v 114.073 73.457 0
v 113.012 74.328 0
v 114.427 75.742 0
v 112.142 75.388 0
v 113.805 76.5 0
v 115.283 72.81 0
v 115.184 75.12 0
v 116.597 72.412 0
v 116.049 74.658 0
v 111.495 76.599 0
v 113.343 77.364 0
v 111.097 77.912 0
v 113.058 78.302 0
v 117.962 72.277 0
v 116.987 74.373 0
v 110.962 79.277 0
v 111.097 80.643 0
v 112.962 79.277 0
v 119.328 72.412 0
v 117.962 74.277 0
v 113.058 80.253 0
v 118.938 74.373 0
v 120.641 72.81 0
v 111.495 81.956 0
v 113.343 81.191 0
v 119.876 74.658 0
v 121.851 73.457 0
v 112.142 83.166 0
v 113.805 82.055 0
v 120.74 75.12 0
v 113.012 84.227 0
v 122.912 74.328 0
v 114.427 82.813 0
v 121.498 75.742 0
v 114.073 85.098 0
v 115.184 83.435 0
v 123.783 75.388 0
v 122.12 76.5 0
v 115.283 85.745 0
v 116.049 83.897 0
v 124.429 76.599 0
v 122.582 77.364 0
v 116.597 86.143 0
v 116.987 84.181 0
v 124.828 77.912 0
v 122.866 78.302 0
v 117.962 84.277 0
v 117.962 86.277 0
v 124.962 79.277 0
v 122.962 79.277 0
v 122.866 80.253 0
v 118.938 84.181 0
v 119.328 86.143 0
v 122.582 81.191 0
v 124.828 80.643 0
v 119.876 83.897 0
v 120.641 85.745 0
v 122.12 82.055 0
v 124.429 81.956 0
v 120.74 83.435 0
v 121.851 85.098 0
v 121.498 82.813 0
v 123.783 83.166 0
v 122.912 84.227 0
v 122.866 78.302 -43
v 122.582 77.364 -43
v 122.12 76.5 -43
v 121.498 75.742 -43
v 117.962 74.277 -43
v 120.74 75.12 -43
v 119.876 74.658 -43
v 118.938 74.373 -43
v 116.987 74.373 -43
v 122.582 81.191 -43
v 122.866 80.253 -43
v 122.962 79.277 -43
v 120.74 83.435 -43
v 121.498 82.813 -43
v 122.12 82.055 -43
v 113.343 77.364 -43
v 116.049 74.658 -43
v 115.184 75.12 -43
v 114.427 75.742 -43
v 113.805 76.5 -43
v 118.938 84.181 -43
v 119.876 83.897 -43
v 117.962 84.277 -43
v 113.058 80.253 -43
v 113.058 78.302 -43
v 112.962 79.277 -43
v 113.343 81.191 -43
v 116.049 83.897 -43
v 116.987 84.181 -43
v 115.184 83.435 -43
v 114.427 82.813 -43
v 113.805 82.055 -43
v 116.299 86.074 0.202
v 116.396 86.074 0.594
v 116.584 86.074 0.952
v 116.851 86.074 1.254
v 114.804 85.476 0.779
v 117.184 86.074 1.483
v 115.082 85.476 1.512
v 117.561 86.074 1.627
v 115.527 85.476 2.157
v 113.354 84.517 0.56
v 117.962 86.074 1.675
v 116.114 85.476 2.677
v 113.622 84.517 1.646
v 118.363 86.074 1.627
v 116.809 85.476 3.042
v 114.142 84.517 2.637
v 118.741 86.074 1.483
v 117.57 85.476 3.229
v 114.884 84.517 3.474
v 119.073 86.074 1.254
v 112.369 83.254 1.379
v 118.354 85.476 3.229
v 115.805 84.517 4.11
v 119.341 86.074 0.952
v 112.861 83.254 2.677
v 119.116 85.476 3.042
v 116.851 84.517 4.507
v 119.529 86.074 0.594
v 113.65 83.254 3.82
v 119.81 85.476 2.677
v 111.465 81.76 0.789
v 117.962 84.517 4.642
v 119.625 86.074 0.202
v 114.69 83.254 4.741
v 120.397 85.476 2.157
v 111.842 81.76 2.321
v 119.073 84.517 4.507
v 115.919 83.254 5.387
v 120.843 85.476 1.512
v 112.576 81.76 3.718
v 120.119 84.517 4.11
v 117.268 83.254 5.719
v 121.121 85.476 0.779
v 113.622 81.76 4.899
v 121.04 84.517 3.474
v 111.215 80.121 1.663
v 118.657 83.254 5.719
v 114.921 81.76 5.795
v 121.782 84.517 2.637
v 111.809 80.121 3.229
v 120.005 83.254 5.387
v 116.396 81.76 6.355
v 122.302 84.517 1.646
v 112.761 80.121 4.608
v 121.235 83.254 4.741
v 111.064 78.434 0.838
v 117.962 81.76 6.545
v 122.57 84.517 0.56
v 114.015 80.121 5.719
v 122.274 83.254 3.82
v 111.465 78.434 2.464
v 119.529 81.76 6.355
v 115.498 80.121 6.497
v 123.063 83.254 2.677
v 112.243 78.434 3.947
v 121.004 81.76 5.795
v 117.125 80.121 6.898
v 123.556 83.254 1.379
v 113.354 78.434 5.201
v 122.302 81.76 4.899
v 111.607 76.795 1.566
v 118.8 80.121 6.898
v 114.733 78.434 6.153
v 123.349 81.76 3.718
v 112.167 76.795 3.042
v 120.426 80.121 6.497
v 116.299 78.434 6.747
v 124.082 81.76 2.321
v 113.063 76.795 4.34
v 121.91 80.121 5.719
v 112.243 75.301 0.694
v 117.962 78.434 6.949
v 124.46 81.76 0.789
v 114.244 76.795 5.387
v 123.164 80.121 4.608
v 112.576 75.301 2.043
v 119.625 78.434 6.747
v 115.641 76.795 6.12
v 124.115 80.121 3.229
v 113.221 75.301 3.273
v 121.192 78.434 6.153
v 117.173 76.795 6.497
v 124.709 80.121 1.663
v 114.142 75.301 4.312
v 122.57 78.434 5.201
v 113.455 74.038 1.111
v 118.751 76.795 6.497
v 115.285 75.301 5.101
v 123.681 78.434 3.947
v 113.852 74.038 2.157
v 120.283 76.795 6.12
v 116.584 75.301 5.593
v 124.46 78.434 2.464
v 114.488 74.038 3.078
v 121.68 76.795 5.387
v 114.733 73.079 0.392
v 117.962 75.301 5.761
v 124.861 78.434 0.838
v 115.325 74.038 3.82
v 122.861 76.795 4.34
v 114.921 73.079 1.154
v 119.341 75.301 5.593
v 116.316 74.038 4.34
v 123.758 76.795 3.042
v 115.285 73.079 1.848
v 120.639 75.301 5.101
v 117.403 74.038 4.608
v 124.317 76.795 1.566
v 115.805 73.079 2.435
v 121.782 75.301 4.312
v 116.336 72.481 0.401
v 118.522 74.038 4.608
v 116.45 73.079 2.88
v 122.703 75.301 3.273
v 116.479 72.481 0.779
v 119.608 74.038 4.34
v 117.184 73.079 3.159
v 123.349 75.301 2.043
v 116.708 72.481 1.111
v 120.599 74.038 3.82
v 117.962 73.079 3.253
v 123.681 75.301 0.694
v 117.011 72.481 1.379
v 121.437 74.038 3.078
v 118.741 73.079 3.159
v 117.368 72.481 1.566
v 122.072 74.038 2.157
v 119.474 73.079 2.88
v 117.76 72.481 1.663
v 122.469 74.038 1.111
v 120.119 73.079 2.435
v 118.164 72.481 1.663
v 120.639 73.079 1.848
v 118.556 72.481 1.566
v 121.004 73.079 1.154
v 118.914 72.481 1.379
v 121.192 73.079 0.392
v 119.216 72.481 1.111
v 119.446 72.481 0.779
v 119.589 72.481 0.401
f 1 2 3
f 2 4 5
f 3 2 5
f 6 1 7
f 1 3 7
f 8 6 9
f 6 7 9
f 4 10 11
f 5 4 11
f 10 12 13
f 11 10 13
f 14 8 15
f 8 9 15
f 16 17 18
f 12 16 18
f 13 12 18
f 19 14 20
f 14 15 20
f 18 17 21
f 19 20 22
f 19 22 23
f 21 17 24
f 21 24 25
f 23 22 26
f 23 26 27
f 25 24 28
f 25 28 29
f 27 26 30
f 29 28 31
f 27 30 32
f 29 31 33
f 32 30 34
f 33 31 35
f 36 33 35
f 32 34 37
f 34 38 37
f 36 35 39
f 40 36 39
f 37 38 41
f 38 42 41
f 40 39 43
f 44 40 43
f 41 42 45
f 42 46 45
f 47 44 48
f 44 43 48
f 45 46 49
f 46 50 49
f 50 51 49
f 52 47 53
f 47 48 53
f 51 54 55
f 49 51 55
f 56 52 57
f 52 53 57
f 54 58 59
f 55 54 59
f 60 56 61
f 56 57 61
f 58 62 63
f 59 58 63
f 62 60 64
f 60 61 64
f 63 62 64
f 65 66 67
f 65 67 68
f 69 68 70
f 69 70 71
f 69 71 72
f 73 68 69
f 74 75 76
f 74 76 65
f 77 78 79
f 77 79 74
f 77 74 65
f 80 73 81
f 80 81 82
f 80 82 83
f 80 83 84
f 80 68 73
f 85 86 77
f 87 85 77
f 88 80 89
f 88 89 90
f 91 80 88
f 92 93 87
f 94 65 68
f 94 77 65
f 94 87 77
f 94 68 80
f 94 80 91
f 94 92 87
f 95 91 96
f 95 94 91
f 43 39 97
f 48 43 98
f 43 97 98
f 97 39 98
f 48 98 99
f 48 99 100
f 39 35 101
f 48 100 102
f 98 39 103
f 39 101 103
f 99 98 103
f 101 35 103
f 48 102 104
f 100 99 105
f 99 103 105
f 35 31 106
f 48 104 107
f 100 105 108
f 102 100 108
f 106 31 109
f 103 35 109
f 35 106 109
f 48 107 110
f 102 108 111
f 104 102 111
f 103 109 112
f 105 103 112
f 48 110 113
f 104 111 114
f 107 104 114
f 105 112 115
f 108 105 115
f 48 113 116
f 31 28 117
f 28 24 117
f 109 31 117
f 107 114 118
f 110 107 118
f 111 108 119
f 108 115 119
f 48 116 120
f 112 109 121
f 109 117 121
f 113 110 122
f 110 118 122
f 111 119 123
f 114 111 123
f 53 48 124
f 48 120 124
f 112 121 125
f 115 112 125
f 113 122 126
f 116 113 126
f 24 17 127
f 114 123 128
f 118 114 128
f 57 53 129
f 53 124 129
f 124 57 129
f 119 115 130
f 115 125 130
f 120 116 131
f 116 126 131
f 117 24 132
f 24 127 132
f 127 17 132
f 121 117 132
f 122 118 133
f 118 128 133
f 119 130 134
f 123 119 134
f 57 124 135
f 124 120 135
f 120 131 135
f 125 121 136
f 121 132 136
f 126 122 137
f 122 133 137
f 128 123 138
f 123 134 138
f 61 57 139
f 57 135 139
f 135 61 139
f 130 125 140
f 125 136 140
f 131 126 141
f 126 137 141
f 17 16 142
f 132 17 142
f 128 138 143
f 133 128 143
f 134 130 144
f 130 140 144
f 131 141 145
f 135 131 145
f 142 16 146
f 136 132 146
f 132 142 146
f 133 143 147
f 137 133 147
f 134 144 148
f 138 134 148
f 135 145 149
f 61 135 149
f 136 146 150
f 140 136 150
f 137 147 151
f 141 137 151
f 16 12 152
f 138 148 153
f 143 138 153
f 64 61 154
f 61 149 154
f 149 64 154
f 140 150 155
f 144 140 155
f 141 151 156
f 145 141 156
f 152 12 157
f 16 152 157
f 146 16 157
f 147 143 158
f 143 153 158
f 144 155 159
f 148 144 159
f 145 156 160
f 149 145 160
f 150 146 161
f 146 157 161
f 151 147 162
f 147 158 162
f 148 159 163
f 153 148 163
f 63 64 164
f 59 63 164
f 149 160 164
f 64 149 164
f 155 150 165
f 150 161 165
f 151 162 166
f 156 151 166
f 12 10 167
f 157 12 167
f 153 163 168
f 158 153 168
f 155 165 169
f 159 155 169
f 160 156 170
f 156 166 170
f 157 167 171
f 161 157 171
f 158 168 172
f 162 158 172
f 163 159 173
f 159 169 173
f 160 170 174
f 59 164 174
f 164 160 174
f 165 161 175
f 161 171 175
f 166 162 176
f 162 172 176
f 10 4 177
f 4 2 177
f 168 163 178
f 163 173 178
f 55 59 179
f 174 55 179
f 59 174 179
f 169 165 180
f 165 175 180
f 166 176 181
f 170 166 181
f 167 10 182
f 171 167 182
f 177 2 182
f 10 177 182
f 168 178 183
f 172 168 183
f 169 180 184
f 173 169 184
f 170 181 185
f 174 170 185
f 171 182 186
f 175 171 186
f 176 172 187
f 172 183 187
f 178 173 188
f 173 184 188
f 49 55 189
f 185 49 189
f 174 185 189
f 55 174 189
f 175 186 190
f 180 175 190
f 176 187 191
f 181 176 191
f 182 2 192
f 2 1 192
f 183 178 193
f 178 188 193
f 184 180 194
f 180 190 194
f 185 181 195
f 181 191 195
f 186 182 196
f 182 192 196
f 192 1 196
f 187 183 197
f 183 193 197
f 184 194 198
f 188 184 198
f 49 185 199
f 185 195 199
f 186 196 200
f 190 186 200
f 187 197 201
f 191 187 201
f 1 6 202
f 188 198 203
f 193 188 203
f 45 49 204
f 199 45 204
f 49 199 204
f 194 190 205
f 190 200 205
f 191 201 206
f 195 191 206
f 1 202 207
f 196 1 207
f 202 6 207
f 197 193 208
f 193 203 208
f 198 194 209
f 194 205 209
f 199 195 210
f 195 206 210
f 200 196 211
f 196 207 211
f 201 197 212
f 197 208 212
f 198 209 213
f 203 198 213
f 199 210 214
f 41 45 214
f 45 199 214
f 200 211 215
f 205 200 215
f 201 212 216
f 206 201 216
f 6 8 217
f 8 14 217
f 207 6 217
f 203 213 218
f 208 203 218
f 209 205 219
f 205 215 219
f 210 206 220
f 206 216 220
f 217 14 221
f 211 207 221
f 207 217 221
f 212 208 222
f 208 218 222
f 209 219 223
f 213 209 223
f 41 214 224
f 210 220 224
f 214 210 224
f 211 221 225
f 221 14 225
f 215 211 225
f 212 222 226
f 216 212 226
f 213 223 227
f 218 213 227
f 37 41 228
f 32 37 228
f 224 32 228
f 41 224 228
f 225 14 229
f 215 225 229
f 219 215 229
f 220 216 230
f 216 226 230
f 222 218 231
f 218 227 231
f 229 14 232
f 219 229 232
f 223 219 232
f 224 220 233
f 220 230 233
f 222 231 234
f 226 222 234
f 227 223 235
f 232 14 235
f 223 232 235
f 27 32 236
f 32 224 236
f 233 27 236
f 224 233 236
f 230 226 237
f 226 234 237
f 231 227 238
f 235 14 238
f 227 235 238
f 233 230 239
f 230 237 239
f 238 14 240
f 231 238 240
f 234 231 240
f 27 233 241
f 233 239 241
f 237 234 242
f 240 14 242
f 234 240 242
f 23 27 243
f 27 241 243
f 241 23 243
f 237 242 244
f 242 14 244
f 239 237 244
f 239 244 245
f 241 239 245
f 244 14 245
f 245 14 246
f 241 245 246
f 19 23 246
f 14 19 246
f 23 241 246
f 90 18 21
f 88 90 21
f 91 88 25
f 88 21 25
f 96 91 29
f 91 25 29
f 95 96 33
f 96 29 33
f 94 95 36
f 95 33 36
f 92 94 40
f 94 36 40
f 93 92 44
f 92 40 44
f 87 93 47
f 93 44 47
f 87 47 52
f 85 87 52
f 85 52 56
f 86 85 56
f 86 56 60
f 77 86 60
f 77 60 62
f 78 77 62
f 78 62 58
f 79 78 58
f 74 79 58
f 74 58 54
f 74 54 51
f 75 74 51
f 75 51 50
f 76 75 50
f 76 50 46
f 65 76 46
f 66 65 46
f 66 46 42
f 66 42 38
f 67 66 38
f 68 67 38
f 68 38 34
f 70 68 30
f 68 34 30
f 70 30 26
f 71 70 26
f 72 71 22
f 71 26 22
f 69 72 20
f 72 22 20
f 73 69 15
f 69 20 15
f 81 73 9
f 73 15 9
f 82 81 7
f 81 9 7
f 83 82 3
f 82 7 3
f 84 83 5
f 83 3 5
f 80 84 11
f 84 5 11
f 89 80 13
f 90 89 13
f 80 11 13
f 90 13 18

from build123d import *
from build123d.topology import SkipClean

# Parameters (mm, degrees)
REVOLVE_4_ANGLE     = 180.0000000000004
SKETCH_2_W          = 15.068111951450035
SKETCH_2_H          = 7.96575550760617
CUT_EXTRUDE_1_DEPTH = 56.00000000000002
SKETCH_3_R          = 4.999999999999991
EXTRUDE_2_DEPTH     = 43.00000000000001
SKETCH_45_R         = 8.000000000000014
CUT_EXTRUDE_2_DEPTH = 10
REVOLVE_5_ANGLE     = 180.0000000000004


with BuildPart() as part:
    # 草图1 → 旋转4 (revolve)
    with BuildSketch(Plane.XY):
        with BuildLine():
            Line((110.00000000000001, 81.99999999999996), (110.00000000000001, 89.99999999999999))
            Line((110.00000000000001, 89.99999999999999), (110.00000000000001, 98))
            ThreePointArc((110.00000000000001, 98), (102, 89.99999999999999), (110.00000000000001, 81.99999999999997))
        make_face()
    revolve(axis=Axis((110.00000000000001, 81.99999999999996, 0), (0, 1, 0)), revolution_arc=REVOLVE_4_ANGLE)

    # 草图2 → 切除-拉伸1 (cut)
    with SkipClean():  # the faces are left unmerged after this step: merging them gives an invalid solid
        with BuildSketch(Plane(origin=(0, 119.99999999999999, 0), x_dir=(1, 0, 0), z_dir=(0, 1, 0))):
            with Locations((110, -6.673230993554715)):
                Rectangle(SKETCH_2_W, SKETCH_2_H)
        extrude(amount=-CUT_EXTRUDE_1_DEPTH, mode=Mode.SUBTRACT)

    # 草图45 → 切除-拉伸2 (cut)
    with BuildSketch(Plane(origin=(0, 0, 0), x_dir=(-1, 0, 6.98e-15), z_dir=(-6.98e-15, 0, -1))):
        with Locations((-110.00000000000001, 89.99999999999999)):
            Circle(SKETCH_45_R)
    extrude(amount=-CUT_EXTRUDE_2_DEPTH, mode=Mode.SUBTRACT)


with BuildPart() as body_2:
    # 草图3 → 凸台-拉伸2 (new body)
    with BuildSketch(Plane(origin=(0, 0, 0), x_dir=(-1, 0, 6.98e-15), z_dir=(-6.98e-15, 0, -1))):
        with Locations((-117.96224151764466, 79.27742160371339)):
            Circle(SKETCH_3_R)
    extrude(amount=EXTRUDE_2_DEPTH)

    # 草图46 → 旋转5 (revolve)
    with BuildSketch(Plane.XY):
        with BuildLine():
            ThreePointArc((117.96224151764446, 74.2774216037134), (112.96224151764467, 79.2774216037134), (117.96224151764447, 84.27742160371338))
            Line((117.96224151764436, 84.27742160371338), (117.96224151764436, 86.27742160371339))
            ThreePointArc((117.96224151764436, 86.27742160371339), (110.96224151764436, 79.27742160371339), (117.96224151764436, 72.27742160371339))
            Line((117.96224151764436, 72.27742160371338), (117.96224151764436, 74.2774216037134))
        make_face()
        with BuildLine():
            Line((117.96224151764436, 74.2774216037134), (117.96224151764436, 79.27742160371339))
            Line((117.96224151764436, 79.27742160371339), (117.96224151764436, 84.27742160371338))
            ThreePointArc((117.96224151764447, 84.27742160371338), (112.96224151764467, 79.2774216037134), (117.96224151764446, 74.2774216037134))
        make_face()
        with BuildLine():
            Line((117.96224151764436, 84.27742160371338), (117.96224151764436, 79.27742160371339))
            Line((117.96224151764436, 79.27742160371339), (117.96224151764436, 74.2774216037134))
            ThreePointArc((117.96224151764446, 74.2774216037134), (121.49777542357731, 75.74188769778058), (122.96224151764464, 79.27742160371339))
            ThreePointArc((122.96224151764464, 79.27742160371339), (121.49777542357732, 82.81295550964619), (117.96224151764447, 84.27742160371338))
        make_face()
    revolve(axis=Axis((117.96224151764436, 86.27742160371339, 0), (0, 1, 0)), revolution_arc=REVOLVE_5_ANGLE)


solid = body_2.part
